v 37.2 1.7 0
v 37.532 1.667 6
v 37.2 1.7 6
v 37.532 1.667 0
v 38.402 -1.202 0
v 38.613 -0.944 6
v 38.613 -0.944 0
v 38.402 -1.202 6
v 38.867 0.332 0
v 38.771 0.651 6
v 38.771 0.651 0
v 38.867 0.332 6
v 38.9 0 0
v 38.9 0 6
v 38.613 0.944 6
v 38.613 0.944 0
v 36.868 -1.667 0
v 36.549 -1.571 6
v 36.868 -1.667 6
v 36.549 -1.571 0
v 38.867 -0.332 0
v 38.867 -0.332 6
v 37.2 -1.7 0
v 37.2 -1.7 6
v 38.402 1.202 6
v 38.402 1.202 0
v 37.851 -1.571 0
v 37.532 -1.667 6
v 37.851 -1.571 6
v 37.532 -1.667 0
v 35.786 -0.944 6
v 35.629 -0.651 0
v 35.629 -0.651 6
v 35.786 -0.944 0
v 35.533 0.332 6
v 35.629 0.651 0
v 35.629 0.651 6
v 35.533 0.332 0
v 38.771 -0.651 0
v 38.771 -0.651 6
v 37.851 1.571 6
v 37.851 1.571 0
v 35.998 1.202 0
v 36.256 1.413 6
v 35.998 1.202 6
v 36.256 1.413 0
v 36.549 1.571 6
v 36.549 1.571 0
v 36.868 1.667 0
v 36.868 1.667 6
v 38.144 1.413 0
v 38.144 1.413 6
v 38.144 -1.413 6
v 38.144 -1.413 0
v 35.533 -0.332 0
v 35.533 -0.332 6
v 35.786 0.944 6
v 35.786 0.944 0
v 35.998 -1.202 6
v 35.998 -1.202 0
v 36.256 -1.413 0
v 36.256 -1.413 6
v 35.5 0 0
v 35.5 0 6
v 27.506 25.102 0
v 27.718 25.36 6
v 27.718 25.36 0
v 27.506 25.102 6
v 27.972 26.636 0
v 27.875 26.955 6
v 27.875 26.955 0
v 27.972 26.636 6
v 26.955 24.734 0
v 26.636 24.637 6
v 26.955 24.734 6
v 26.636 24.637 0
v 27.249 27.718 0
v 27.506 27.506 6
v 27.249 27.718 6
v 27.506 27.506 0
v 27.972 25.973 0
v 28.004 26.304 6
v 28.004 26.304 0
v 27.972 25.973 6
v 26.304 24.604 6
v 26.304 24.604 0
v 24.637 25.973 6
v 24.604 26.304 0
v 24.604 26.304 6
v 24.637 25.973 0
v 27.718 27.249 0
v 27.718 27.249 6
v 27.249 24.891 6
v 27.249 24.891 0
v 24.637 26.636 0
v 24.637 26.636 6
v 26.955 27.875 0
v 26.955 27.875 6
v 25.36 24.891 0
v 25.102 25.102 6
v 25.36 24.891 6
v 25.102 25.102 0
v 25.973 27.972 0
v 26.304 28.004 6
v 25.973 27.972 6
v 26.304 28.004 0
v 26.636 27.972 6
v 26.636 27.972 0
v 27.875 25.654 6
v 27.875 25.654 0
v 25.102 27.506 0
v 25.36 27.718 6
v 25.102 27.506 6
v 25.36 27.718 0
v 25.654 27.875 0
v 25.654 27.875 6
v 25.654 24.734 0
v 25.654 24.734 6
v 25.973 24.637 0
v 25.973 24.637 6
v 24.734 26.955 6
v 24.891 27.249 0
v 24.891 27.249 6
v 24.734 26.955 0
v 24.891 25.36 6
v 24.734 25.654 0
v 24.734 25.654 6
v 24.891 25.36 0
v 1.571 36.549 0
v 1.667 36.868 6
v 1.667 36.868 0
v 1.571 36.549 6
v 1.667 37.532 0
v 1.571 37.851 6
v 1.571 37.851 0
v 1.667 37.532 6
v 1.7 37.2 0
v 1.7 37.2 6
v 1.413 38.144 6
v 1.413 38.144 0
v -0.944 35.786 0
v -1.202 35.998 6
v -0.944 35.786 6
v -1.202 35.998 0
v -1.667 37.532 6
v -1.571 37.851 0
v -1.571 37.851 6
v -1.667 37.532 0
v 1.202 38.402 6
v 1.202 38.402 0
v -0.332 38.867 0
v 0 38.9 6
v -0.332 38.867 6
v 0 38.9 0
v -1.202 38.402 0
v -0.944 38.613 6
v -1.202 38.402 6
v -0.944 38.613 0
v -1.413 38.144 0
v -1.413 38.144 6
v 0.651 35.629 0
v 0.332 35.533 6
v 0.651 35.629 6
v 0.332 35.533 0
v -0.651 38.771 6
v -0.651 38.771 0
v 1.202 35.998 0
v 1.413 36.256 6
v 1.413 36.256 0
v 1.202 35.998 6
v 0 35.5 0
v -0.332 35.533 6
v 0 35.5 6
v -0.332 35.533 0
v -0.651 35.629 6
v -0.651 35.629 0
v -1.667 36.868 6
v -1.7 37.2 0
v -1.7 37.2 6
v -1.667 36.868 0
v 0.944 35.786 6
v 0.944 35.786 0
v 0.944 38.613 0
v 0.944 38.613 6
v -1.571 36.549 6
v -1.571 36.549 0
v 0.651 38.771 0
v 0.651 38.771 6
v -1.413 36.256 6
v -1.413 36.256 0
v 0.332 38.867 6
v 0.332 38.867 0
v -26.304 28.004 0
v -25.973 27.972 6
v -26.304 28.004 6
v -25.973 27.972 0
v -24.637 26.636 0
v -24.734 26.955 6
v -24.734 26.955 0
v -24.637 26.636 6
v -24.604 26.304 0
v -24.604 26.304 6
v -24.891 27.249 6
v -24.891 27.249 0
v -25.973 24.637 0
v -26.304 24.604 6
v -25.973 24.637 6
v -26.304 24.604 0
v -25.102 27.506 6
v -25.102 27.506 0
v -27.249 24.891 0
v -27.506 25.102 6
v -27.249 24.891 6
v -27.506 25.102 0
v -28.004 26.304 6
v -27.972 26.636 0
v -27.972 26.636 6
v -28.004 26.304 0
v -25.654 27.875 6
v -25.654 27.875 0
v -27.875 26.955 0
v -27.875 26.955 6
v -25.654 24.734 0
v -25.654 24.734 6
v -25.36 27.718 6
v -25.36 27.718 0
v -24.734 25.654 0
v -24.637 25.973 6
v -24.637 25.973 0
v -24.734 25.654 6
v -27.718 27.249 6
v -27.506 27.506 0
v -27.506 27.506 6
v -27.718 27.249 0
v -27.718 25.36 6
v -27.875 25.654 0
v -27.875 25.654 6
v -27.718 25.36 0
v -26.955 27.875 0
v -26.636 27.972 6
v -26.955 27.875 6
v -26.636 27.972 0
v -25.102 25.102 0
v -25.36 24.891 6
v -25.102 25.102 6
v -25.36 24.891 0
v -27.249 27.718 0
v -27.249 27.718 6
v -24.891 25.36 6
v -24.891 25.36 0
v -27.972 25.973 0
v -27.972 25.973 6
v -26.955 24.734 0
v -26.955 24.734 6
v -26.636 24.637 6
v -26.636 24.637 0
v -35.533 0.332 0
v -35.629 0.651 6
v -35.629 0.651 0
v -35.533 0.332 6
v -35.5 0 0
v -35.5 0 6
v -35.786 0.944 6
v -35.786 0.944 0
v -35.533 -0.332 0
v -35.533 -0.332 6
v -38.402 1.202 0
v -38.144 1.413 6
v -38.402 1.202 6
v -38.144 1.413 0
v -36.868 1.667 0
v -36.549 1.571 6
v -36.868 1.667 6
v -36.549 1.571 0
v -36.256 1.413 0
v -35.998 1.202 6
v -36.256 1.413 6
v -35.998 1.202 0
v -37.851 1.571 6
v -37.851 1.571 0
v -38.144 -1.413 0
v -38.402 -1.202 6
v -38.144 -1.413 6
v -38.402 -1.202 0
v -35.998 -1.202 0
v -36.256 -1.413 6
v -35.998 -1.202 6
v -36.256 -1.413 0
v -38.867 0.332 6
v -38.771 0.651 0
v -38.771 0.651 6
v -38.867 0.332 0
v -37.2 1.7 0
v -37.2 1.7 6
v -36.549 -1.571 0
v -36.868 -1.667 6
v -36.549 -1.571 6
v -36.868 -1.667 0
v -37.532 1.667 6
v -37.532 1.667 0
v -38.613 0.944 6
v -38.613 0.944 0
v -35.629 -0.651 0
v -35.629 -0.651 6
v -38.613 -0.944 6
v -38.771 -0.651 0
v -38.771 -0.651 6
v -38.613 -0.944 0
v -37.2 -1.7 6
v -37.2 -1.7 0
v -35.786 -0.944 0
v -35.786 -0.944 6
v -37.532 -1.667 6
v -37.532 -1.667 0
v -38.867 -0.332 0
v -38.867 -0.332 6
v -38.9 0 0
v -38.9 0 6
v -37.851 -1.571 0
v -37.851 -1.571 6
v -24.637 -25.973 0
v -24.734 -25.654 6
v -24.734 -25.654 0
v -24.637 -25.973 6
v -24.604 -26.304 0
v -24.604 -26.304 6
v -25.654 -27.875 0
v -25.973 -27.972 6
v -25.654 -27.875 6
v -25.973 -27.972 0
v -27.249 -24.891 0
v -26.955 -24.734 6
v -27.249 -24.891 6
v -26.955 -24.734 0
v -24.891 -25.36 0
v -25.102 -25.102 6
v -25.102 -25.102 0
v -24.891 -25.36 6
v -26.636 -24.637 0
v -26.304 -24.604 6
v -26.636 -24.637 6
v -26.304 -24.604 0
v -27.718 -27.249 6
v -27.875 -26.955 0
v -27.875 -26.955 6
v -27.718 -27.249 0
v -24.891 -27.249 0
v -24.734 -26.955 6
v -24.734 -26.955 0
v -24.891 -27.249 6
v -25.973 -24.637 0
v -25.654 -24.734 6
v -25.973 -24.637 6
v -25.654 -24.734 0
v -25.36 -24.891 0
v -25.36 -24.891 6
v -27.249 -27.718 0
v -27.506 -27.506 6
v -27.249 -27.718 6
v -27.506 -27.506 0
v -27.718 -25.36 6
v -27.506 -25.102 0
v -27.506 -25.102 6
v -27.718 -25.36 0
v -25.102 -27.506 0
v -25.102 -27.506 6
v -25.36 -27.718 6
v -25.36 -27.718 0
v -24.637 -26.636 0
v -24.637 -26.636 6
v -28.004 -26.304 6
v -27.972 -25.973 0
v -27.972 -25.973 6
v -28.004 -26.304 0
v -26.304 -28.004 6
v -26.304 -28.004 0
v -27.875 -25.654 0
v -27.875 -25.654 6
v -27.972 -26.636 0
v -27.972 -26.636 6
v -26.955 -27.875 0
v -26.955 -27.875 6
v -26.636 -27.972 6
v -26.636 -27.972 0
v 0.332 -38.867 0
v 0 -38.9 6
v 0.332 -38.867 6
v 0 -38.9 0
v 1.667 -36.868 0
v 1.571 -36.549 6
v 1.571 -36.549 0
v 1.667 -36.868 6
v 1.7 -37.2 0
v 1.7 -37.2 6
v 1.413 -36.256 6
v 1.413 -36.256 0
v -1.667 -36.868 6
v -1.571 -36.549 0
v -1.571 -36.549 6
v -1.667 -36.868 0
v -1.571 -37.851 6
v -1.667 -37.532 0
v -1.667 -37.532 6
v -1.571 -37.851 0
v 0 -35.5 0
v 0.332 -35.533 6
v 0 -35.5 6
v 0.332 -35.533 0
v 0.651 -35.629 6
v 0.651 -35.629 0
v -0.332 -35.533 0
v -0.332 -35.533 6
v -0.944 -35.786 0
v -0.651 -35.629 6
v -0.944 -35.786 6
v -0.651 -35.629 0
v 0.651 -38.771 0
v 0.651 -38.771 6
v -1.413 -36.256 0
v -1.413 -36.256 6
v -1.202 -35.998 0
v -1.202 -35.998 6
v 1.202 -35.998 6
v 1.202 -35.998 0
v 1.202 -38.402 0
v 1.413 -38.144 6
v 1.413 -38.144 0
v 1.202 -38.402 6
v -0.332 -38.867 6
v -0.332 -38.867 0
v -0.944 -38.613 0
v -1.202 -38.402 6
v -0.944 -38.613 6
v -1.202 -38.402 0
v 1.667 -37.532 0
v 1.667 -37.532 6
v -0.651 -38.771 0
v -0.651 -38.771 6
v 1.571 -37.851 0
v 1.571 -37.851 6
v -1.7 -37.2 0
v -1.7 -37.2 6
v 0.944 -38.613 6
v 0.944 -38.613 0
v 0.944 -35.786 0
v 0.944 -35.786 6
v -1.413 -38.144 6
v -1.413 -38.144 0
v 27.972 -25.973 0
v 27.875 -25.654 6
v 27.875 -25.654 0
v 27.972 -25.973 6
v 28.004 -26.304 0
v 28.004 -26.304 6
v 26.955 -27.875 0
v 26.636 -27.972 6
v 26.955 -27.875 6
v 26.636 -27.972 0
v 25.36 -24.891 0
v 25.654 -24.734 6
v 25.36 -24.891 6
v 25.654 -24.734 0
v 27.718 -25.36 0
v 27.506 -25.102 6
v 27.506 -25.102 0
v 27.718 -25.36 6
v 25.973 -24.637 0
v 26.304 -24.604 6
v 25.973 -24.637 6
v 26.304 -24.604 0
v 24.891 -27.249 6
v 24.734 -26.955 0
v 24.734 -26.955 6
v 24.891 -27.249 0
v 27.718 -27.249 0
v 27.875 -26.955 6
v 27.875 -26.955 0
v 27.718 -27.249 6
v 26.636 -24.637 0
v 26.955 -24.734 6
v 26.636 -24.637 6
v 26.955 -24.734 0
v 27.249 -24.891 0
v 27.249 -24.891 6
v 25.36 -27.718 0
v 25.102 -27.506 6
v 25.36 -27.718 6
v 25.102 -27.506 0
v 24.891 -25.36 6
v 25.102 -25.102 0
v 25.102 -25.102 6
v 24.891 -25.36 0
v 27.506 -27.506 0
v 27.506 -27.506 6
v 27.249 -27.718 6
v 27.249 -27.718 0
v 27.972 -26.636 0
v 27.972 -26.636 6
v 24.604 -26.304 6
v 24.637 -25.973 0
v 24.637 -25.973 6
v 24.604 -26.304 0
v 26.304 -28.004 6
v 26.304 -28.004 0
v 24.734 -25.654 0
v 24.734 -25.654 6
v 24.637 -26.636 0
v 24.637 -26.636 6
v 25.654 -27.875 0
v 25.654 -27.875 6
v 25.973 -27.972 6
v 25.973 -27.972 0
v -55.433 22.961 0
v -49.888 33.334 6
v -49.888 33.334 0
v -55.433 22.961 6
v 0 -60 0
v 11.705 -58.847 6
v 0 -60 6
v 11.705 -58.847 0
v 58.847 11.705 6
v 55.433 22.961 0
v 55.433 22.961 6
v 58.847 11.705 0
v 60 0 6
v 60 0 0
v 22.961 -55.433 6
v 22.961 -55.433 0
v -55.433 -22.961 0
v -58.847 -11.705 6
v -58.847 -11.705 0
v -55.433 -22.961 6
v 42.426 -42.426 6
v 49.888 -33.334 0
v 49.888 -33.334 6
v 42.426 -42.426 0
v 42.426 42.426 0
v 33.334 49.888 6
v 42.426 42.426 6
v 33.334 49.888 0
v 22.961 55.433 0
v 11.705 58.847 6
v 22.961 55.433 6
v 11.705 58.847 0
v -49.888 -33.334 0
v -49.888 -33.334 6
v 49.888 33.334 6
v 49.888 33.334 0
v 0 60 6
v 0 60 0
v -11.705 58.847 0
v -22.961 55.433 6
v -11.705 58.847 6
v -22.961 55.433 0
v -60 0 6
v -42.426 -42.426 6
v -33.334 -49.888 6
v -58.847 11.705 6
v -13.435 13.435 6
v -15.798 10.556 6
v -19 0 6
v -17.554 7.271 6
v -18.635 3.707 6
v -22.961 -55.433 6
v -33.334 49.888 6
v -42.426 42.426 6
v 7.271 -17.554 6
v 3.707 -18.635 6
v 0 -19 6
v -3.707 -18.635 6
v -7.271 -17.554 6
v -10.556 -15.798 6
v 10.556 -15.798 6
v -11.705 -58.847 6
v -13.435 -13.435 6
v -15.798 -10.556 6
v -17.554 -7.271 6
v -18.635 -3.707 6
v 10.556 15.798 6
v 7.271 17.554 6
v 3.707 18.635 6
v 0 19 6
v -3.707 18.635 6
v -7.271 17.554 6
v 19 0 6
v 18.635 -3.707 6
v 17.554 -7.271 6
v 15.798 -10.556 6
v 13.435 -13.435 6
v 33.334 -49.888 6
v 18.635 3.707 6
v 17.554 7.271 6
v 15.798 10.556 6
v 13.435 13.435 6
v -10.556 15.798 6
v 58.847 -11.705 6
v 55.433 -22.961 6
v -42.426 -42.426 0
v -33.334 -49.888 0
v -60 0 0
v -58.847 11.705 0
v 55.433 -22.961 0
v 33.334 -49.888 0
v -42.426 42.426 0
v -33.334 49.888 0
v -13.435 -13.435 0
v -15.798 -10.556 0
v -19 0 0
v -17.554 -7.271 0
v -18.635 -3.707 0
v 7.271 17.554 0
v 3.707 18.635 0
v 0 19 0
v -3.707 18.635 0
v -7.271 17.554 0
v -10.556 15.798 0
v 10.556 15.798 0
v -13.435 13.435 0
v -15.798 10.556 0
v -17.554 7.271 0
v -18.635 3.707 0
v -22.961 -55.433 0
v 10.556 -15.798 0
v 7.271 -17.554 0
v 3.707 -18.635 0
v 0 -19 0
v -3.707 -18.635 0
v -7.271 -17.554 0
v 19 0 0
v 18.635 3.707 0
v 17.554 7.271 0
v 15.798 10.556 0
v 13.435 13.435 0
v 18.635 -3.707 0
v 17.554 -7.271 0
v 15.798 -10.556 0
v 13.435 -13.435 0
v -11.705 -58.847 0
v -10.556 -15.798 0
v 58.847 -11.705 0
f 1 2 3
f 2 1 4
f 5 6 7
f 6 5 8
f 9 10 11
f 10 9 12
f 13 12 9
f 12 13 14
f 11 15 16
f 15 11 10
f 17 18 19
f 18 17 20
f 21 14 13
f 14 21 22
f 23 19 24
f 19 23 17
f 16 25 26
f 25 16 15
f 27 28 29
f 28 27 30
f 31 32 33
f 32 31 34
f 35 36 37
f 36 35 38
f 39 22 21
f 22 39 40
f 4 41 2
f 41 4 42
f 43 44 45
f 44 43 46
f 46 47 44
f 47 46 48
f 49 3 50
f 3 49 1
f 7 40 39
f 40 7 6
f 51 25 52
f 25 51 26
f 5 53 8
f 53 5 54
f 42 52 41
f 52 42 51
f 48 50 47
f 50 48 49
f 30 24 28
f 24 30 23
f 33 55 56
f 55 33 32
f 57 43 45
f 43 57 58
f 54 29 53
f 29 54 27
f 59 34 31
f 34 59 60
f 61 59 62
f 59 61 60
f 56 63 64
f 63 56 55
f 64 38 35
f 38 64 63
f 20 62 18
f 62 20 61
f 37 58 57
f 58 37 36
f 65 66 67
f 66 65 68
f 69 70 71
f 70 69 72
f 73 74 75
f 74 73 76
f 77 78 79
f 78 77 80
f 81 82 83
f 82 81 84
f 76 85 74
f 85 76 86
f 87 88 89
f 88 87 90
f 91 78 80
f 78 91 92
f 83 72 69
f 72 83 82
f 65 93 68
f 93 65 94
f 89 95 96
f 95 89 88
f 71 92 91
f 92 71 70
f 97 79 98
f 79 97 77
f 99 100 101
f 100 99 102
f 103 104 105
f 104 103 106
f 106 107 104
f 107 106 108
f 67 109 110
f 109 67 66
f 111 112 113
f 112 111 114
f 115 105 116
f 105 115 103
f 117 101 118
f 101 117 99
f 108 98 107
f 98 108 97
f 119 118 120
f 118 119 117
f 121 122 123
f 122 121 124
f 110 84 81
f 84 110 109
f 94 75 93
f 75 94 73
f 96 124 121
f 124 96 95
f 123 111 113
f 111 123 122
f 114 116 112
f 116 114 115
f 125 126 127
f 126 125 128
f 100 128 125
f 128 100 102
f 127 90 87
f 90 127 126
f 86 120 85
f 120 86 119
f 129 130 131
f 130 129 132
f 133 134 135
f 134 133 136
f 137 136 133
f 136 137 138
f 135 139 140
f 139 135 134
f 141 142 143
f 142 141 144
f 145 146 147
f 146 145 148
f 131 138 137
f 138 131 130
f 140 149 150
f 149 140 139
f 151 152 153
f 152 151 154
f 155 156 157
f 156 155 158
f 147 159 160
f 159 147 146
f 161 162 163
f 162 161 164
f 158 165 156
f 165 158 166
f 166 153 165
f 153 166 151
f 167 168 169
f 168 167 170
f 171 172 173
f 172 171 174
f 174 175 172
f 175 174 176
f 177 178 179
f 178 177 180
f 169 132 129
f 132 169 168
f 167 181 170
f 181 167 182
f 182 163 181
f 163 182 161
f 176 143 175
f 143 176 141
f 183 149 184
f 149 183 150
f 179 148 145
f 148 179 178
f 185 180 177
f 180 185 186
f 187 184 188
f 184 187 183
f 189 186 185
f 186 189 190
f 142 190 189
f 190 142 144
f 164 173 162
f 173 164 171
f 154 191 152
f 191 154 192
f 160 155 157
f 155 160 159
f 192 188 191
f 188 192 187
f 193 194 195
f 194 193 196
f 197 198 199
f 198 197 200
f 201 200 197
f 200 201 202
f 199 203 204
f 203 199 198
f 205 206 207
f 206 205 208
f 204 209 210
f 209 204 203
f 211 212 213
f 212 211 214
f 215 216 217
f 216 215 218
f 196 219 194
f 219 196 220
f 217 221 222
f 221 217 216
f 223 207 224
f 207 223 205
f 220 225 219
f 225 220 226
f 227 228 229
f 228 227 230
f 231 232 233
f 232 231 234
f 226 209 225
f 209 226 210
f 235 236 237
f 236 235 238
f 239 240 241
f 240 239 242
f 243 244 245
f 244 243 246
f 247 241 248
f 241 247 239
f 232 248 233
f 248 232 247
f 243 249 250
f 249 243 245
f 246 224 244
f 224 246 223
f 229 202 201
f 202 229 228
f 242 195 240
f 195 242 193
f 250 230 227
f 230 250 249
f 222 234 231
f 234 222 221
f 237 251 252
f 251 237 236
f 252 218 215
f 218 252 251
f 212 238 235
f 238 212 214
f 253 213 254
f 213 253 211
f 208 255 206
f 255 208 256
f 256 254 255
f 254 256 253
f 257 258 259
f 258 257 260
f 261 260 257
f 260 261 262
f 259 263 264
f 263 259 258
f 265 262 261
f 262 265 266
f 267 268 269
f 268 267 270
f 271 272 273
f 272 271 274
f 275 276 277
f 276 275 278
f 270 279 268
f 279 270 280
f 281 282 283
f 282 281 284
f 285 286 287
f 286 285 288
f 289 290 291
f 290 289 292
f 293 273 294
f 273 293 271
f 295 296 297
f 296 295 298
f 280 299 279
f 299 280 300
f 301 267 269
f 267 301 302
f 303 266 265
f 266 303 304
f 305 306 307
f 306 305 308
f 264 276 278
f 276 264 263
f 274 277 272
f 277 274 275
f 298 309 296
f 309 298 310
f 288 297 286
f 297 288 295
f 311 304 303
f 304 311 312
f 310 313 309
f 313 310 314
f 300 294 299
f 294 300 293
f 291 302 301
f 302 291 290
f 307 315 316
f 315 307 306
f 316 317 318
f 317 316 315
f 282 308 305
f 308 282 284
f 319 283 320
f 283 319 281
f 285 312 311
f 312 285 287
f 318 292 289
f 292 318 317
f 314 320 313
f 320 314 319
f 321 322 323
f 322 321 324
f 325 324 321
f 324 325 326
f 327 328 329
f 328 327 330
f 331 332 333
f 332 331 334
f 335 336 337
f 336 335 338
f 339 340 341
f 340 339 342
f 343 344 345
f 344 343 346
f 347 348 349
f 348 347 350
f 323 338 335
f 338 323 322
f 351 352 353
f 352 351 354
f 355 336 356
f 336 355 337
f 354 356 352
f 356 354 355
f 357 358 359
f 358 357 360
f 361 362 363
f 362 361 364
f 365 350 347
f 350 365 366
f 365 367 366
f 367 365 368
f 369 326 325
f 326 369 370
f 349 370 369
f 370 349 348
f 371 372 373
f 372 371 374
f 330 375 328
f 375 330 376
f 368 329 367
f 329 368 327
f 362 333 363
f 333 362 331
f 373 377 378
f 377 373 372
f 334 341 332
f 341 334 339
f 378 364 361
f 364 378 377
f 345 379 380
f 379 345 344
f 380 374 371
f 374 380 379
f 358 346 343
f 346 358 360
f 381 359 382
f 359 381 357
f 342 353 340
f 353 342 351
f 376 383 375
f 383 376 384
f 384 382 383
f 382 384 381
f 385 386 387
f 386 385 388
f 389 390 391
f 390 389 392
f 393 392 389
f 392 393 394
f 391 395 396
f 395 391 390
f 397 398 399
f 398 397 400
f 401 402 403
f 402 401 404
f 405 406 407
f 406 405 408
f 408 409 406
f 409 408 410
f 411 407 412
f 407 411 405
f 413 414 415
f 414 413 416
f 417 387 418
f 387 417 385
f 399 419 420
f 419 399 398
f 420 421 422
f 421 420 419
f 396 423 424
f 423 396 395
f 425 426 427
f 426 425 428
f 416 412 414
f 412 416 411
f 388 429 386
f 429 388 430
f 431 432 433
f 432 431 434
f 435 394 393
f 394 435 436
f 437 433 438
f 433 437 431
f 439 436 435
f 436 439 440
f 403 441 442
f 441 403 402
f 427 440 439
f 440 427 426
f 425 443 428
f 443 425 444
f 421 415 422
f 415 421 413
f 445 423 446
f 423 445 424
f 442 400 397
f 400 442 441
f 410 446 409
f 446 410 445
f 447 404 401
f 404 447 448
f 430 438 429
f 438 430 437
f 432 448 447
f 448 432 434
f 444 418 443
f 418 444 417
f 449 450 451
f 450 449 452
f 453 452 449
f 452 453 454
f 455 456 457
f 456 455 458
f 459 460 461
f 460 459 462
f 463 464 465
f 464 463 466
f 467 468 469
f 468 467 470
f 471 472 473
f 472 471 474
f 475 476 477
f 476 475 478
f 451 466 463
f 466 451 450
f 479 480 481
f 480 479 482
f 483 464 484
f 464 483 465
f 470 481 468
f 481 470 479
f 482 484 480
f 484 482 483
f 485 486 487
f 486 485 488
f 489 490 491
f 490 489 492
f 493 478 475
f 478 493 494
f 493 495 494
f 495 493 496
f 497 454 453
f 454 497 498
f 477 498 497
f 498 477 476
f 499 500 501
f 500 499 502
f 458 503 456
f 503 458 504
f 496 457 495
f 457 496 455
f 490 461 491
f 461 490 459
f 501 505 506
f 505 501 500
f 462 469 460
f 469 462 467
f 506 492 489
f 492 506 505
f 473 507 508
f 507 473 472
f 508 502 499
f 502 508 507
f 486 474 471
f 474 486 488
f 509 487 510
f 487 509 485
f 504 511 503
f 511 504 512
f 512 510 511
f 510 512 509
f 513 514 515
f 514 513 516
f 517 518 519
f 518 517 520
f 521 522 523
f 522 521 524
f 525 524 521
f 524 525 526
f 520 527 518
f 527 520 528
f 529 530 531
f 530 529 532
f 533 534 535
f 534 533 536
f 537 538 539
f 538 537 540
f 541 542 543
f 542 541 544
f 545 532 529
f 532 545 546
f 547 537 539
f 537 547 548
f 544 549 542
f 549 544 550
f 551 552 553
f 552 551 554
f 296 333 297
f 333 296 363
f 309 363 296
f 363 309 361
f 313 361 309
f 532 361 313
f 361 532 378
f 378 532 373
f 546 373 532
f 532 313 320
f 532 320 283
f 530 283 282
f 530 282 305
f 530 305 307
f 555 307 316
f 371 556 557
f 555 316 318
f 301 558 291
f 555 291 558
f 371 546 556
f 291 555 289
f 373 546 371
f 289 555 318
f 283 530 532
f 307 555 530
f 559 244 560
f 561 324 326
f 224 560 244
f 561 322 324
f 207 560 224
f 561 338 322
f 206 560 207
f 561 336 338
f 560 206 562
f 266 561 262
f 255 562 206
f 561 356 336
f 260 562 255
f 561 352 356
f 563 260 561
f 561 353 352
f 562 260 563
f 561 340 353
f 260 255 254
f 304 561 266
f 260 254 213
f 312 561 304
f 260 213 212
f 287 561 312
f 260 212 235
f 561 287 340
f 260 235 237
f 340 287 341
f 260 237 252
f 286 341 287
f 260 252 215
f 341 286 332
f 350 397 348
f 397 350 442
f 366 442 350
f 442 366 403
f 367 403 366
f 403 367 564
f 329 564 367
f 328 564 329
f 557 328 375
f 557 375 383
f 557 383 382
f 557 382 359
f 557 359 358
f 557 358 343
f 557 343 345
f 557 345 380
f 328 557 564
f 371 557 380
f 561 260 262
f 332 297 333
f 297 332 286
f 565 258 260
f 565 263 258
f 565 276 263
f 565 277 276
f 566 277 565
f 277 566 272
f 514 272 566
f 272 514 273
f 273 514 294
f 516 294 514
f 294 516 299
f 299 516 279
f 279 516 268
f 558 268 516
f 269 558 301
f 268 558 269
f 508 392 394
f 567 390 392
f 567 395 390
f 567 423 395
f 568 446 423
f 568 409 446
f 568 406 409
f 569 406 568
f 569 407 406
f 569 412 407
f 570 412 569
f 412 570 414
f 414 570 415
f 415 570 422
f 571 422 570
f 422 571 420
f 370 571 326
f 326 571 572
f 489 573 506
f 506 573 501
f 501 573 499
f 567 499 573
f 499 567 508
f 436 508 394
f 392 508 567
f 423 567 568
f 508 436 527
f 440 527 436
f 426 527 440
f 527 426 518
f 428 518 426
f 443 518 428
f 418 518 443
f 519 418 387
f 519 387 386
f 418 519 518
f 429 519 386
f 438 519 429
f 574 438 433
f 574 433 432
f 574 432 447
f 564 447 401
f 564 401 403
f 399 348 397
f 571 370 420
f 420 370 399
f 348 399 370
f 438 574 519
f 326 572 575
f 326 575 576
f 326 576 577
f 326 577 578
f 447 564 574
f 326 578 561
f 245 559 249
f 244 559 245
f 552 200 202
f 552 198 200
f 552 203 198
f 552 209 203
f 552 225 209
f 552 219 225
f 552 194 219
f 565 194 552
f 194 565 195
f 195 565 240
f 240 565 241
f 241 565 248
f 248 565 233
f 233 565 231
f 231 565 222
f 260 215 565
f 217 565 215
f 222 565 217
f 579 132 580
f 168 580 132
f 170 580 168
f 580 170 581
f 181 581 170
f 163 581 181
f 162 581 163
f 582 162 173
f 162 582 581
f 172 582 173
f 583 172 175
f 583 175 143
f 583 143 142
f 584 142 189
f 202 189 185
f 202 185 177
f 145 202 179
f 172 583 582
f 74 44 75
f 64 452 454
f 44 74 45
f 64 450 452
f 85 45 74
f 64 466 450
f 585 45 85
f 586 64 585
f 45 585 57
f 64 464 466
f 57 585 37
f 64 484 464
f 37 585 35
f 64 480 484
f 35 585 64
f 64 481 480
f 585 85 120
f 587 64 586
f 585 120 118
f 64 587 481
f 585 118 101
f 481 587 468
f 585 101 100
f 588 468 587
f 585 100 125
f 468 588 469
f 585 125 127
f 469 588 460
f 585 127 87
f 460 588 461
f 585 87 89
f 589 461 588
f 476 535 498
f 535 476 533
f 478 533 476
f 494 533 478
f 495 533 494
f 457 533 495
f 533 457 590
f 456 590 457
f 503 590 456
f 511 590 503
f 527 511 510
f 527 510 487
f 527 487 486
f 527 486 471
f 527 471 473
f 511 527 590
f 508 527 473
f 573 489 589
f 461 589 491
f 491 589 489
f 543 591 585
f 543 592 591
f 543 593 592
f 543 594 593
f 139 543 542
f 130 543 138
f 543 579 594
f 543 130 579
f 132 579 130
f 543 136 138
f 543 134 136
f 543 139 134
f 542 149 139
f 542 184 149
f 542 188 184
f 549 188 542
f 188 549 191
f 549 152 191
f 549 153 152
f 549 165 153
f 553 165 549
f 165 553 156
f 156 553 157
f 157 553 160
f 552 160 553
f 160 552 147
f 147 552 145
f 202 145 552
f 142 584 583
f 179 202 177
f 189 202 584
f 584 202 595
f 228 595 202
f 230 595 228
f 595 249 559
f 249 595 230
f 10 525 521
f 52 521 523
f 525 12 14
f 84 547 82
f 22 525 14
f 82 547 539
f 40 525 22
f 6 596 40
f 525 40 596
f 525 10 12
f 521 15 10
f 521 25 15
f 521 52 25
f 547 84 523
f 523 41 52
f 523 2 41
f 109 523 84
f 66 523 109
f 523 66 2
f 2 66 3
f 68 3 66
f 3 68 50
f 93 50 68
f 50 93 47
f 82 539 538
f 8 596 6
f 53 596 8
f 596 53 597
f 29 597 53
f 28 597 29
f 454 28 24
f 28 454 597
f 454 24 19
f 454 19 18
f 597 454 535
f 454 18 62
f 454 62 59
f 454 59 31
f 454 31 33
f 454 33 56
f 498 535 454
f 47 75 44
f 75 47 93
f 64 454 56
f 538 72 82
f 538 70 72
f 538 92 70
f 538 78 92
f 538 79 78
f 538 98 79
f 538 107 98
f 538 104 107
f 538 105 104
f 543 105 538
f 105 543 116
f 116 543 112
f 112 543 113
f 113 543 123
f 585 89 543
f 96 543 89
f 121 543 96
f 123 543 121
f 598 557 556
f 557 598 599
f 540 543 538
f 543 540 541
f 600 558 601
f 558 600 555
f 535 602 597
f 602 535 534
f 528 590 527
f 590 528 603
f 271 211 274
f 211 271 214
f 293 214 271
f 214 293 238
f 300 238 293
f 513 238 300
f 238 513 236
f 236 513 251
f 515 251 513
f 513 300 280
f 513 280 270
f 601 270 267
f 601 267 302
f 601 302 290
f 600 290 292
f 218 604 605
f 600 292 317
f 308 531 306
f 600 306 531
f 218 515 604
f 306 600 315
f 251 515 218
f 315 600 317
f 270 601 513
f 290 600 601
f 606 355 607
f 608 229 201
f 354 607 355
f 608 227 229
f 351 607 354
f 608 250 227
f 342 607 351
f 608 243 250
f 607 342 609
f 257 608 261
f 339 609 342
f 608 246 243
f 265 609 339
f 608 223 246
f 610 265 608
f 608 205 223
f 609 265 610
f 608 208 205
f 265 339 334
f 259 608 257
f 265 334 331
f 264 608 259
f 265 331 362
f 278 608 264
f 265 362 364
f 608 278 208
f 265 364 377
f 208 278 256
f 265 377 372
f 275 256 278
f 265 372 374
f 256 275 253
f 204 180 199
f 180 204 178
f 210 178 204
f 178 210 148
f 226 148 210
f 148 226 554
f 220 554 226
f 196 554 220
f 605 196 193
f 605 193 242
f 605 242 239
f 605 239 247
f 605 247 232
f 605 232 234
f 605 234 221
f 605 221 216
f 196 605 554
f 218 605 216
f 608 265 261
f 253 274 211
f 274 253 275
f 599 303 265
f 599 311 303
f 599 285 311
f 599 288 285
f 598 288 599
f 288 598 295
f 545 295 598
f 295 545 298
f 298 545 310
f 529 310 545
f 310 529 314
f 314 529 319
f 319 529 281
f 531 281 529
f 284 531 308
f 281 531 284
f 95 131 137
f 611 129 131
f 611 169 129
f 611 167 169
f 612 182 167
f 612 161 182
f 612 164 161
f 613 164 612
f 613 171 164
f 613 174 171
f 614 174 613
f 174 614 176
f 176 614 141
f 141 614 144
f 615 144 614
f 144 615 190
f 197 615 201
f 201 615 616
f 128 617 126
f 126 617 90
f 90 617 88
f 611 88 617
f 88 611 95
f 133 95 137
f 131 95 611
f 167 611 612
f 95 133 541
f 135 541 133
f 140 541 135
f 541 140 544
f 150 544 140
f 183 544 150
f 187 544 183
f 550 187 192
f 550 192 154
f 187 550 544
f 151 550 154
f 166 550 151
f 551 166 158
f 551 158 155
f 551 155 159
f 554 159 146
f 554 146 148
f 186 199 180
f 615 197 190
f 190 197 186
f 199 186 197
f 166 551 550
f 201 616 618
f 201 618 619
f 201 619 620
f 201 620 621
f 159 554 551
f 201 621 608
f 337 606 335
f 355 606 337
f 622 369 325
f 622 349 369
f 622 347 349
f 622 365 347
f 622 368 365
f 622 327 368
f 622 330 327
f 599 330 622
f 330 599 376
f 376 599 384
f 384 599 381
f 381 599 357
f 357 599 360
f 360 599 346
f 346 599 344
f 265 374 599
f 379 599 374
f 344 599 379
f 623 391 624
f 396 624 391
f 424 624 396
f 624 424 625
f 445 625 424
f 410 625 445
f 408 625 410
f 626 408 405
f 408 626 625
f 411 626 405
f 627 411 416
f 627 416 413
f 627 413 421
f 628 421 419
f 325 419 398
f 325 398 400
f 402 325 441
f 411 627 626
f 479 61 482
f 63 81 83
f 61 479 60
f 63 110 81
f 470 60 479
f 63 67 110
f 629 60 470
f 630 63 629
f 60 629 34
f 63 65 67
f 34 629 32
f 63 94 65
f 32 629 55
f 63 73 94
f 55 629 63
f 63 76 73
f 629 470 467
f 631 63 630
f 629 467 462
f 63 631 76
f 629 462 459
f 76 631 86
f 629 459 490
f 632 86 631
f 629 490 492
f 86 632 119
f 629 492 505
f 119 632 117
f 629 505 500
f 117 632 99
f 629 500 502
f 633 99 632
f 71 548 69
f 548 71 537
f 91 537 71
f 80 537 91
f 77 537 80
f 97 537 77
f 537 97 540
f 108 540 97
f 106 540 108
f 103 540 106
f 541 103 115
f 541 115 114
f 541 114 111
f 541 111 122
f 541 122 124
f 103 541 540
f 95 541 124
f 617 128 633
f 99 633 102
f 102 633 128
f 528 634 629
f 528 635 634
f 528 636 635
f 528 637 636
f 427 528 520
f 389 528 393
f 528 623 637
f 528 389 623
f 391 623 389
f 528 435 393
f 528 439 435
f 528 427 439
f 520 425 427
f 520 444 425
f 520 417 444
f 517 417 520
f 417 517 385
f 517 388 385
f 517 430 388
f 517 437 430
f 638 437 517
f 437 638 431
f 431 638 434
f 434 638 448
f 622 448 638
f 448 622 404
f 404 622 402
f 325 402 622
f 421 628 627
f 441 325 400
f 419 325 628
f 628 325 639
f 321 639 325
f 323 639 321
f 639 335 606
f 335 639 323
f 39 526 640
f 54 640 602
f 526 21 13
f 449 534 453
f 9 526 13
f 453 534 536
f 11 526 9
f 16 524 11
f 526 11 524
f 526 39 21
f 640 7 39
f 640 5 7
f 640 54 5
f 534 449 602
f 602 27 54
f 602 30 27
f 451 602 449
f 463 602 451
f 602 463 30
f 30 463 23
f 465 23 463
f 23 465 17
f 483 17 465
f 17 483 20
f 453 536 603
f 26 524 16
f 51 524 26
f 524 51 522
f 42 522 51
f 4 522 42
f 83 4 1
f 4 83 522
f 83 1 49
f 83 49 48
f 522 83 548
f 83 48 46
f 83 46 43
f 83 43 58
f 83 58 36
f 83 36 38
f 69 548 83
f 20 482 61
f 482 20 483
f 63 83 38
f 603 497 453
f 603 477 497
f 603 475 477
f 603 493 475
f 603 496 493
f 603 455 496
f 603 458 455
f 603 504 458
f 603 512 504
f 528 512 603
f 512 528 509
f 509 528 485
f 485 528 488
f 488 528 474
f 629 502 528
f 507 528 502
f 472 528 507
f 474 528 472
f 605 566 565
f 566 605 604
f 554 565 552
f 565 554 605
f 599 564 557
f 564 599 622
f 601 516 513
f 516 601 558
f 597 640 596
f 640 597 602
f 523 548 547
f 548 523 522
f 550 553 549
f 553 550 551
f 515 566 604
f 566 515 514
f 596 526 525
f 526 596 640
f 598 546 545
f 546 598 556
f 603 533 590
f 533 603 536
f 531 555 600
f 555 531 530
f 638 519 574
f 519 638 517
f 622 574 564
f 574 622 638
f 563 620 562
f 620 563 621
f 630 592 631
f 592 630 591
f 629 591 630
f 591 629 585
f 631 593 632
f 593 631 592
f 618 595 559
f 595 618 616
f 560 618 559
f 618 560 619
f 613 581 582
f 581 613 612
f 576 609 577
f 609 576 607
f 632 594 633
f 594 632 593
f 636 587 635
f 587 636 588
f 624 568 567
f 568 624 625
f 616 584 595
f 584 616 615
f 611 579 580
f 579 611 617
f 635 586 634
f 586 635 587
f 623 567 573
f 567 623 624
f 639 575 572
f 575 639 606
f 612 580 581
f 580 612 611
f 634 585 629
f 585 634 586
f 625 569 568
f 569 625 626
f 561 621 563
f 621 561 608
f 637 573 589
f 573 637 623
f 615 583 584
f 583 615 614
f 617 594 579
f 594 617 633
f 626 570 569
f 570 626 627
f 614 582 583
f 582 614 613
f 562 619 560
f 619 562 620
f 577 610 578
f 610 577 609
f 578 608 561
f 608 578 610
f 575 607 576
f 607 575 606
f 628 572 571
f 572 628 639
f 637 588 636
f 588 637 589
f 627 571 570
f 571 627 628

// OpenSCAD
$fn = 32;

// ----------------------------------------------------------------------
// Flange Ø120 x 6
// 8 holes on a Ø74.4 bolt circle, bolted joints
// ----------------------------------------------------------------------

// --- parameters (mm) ---
flange_d = 120;  // outside diameter of the flange
thickness = 6;   // flange thickness
holes = 8;       // number of bolt holes
pcd = 74.4;      // bolt circle diameter
start_deg = 0;   // angle of the first hole, from +X
hole_d = 3.4;    // bolt hole diameter
bore_d = 38;     // central through bore
hub_d = 50;      // hub outside diameter
hub_h = 0;       // hub height above the flange face (0 = no hub)

// --- derived feature positions (mm) ---
height = thickness + hub_h;  // = 6   overall height of the part
pcd_r = pcd / 2;             // = 37.2   bolt circle radius
hole_step = 360 / holes;     // = 45   angular pitch
feature_centers = [
  [pcd_r * cos(start_deg + 0 * hole_step), pcd_r * sin(start_deg + 0 * hole_step)],
  [pcd_r * cos(start_deg + 1 * hole_step), pcd_r * sin(start_deg + 1 * hole_step)],
  [pcd_r * cos(start_deg + 2 * hole_step), pcd_r * sin(start_deg + 2 * hole_step)],
  [pcd_r * cos(start_deg + 3 * hole_step), pcd_r * sin(start_deg + 3 * hole_step)],
  [pcd_r * cos(start_deg + 4 * hole_step), pcd_r * sin(start_deg + 4 * hole_step)],
  [pcd_r * cos(start_deg + 5 * hole_step), pcd_r * sin(start_deg + 5 * hole_step)],
  [pcd_r * cos(start_deg + 6 * hole_step), pcd_r * sin(start_deg + 6 * hole_step)],
  [pcd_r * cos(start_deg + 7 * hole_step), pcd_r * sin(start_deg + 7 * hole_step)]
];   // bolt hole centres on the pitch circle

// flange disc, every hole and the bore cut straight through
difference() {
  union() {
    cylinder(d = flange_d, h = thickness);
  }
  translate([0, 0, -1]) cylinder(d = bore_d, h = height + 2);  // bore, through
  for (centre = feature_centers)
    translate([centre[0], centre[1], -1]) cylinder(d = hole_d, h = thickness + 2);
}
